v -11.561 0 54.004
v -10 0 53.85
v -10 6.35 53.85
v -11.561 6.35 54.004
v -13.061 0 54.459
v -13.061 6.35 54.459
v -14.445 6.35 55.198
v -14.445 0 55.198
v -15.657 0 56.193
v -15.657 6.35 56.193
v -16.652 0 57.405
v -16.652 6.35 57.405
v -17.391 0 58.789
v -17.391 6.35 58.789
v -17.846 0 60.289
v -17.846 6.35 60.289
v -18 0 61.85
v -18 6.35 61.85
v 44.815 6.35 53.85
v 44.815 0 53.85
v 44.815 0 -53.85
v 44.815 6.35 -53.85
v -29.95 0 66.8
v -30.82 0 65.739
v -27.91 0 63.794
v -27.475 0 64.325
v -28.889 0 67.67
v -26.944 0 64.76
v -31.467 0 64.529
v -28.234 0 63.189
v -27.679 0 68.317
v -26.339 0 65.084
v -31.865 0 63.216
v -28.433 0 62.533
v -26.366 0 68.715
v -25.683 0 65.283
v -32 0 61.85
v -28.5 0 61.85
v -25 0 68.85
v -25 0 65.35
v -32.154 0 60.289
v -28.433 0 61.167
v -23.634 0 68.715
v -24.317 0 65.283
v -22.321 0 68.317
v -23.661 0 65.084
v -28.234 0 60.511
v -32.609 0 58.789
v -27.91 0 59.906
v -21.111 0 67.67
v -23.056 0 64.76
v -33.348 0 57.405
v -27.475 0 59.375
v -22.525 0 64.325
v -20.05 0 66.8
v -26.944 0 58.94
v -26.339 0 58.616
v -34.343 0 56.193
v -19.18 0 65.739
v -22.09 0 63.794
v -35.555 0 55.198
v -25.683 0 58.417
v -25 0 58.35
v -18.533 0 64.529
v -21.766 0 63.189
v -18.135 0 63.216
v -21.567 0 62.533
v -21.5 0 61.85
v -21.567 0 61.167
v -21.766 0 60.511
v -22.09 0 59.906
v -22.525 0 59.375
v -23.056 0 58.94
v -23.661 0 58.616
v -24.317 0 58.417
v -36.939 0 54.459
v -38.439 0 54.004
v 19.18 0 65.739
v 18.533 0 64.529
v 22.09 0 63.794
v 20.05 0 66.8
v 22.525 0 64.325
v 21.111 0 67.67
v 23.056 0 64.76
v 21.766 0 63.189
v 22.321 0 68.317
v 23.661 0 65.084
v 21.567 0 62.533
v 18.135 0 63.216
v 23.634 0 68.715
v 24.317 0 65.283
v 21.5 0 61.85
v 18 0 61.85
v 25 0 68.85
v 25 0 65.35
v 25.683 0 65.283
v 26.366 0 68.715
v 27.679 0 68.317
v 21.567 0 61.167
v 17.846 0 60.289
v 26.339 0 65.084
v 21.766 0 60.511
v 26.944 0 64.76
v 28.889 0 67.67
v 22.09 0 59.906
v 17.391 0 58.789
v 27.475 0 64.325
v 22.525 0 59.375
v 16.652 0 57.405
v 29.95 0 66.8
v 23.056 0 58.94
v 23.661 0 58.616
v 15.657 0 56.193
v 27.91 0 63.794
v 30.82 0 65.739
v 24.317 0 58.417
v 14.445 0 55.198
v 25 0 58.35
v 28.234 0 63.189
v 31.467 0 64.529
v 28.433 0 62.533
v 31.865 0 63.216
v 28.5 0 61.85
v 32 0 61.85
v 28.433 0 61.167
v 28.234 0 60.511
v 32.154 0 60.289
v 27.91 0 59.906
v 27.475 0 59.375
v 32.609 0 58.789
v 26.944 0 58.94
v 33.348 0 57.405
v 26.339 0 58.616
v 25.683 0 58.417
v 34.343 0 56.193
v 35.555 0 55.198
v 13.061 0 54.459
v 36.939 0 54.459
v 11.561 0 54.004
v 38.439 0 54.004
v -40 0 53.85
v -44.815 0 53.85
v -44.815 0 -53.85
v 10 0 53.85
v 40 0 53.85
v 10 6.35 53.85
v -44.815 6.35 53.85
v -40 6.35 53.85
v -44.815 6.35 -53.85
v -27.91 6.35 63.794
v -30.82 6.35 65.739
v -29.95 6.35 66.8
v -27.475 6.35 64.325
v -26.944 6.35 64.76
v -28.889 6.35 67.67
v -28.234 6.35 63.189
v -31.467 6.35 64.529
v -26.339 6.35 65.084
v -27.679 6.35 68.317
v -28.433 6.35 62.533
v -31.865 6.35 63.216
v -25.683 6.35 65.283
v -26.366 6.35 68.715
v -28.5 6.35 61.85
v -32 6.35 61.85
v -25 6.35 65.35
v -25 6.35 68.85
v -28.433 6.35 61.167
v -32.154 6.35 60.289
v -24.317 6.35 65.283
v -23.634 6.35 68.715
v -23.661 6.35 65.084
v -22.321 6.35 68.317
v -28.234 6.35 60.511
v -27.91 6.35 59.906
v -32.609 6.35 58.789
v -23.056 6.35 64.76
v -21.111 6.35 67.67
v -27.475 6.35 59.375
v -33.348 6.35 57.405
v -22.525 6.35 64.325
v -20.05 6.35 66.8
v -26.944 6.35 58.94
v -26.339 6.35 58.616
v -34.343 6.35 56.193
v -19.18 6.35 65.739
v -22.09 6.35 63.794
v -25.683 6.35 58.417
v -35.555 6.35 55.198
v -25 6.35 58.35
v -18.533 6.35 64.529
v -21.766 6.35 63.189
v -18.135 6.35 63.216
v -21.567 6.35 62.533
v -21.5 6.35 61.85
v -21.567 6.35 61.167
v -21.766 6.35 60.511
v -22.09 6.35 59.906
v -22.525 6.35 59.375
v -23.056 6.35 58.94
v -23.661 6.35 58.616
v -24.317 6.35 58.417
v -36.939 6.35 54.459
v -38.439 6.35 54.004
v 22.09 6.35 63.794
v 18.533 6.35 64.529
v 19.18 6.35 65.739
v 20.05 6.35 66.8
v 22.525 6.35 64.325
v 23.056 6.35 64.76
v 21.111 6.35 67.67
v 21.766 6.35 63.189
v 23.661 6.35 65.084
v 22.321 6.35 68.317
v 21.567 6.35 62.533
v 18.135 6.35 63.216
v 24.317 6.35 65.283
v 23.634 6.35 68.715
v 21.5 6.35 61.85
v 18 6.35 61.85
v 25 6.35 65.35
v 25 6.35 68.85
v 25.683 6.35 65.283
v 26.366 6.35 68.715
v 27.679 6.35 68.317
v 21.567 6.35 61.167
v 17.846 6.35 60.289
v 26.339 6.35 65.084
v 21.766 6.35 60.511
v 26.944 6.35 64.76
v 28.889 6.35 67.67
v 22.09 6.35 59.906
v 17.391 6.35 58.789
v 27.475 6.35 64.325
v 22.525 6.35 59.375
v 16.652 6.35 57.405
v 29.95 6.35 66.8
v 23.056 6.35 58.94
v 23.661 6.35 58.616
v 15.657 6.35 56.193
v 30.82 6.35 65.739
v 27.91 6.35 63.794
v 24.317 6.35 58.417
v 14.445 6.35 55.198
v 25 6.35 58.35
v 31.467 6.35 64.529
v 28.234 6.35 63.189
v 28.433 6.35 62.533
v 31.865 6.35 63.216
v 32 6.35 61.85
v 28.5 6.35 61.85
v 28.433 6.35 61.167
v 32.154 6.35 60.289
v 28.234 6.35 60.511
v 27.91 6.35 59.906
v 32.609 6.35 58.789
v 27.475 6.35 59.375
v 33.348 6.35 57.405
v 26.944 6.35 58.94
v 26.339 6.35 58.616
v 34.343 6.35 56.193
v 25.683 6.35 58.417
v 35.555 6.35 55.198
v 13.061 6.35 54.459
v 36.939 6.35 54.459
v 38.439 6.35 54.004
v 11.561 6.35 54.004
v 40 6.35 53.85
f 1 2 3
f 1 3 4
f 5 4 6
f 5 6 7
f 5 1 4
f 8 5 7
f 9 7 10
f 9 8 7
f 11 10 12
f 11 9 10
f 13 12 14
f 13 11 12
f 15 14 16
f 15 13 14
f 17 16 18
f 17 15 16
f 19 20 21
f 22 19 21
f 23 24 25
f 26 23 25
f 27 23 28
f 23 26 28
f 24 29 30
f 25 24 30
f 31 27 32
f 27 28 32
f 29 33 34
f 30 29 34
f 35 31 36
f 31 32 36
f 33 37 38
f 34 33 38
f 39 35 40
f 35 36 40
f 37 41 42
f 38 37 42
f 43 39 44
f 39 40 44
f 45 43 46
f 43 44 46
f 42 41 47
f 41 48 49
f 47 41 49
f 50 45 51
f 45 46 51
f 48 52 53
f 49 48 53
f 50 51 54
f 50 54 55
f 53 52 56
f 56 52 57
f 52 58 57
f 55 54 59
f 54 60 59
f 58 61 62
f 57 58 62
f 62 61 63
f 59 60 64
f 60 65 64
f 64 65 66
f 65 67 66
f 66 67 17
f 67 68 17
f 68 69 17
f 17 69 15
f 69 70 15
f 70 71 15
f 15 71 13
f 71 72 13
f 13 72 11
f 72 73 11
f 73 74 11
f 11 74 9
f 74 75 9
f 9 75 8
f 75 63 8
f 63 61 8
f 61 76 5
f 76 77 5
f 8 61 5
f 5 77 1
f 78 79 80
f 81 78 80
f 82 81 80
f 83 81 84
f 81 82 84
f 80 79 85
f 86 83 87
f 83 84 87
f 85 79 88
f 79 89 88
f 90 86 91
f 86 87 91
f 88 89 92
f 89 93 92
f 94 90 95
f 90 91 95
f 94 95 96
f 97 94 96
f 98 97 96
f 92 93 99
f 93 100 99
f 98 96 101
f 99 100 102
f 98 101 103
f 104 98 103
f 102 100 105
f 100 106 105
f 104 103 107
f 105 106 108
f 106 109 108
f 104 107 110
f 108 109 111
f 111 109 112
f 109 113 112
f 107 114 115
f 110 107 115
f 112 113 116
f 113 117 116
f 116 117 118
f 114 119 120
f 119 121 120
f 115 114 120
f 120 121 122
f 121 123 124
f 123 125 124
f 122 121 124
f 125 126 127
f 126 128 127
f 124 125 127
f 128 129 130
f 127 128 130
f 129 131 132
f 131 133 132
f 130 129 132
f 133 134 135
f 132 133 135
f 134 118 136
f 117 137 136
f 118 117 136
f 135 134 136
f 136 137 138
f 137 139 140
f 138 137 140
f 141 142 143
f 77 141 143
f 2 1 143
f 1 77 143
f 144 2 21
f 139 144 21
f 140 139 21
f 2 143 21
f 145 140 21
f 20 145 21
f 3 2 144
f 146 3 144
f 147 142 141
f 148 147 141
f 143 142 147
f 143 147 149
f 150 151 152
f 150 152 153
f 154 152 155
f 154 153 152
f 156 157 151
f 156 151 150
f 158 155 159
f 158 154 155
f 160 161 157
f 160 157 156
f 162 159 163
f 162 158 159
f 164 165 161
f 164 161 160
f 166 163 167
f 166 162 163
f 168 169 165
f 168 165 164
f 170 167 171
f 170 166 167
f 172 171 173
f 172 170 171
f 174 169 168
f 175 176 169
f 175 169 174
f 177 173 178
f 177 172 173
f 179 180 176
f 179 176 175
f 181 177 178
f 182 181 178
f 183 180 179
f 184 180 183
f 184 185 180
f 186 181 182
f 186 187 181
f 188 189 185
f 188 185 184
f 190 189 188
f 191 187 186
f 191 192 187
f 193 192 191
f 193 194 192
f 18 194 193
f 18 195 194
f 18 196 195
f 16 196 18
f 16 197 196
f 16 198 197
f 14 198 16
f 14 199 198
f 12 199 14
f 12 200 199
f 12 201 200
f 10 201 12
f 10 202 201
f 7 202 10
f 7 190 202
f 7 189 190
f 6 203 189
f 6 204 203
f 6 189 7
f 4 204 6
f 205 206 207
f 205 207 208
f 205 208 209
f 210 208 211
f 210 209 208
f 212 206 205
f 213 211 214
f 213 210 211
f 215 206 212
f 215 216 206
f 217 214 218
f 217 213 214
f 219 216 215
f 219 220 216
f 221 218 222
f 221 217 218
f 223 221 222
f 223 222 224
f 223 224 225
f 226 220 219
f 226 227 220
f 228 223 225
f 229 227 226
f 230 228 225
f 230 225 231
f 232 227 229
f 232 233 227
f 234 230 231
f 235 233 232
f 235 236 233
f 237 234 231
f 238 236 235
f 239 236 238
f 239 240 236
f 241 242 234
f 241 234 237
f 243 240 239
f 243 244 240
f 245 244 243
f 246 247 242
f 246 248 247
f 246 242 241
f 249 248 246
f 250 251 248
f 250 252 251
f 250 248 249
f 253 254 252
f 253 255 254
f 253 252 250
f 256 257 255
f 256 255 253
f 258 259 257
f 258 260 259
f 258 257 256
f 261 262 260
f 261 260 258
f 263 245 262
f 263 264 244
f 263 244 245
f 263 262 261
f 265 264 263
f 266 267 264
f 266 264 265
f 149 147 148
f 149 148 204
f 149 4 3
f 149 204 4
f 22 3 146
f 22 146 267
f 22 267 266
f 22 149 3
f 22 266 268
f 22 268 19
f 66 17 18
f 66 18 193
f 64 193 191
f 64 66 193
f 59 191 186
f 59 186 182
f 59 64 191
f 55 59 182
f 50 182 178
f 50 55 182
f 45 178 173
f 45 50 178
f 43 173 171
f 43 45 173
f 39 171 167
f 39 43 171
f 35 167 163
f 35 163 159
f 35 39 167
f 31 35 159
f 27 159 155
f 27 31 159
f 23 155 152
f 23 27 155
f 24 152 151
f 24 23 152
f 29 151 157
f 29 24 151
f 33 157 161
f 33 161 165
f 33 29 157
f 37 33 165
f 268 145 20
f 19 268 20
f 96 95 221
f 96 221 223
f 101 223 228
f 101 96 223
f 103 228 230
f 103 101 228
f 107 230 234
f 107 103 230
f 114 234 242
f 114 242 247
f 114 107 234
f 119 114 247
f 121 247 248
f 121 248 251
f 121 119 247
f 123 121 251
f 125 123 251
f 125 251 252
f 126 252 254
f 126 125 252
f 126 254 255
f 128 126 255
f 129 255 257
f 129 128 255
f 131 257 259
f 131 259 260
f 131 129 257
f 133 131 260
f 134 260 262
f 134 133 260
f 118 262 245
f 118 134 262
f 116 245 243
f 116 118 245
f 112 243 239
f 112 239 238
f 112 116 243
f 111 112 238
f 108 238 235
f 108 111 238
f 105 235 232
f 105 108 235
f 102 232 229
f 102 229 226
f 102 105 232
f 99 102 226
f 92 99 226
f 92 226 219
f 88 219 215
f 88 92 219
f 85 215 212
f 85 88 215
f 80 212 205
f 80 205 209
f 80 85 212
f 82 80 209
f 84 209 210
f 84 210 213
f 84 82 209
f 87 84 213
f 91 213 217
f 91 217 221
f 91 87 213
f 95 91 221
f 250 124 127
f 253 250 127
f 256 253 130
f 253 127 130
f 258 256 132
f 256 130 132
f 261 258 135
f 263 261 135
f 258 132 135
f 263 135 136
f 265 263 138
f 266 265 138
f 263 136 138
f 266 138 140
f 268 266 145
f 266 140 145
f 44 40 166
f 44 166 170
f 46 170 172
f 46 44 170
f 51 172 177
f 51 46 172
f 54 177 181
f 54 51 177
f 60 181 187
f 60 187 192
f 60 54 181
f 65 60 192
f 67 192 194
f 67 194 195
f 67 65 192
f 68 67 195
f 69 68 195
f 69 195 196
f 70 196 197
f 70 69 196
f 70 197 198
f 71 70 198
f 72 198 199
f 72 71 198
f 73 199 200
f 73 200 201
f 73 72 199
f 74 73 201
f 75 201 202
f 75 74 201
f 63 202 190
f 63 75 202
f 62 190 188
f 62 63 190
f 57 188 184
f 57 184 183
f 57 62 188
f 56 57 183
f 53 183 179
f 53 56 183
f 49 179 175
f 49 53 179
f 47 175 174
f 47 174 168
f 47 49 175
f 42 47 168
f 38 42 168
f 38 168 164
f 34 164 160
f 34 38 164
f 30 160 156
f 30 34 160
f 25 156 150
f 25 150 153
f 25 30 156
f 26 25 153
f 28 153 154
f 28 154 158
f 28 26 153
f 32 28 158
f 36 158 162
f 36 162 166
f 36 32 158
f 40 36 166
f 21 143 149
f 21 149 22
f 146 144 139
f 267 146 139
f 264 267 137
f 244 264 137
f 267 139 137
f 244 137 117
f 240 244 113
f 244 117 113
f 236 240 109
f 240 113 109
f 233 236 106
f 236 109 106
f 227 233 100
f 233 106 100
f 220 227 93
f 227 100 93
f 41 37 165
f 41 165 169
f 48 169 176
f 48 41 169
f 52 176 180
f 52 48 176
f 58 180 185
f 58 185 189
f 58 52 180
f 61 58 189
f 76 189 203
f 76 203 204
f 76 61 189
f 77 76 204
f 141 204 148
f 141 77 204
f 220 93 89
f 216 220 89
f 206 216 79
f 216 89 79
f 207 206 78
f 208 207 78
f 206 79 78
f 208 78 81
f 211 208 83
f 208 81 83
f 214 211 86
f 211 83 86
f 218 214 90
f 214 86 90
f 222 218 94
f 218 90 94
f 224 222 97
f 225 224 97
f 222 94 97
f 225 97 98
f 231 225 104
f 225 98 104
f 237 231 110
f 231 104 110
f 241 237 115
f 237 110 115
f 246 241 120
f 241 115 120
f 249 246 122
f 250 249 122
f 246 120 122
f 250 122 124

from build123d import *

# Parameters (mm, degrees)
SKETCH1_W           = 89.63
SKETCH1_H           = 107.7
BOSS_EXTRUDE1_DEPTH = 6.35
SKETCH2_R           = 3.5
BOSS_EXTRUDE2_DEPTH = 6.35


with BuildPart() as part:
    # Sketch1 → Boss-Extrude1 (new body)
    with BuildSketch(Plane(origin=(0, 0, 0), x_dir=(1, 0, 0), z_dir=(0, 1, 0))):
        Rectangle(SKETCH1_W, SKETCH1_H)
    extrude(amount=BOSS_EXTRUDE1_DEPTH)

    # Sketch2 → Boss-Extrude2 (add)
    # profile 1 of 2: a face of its own
    with BuildSketch(Plane(origin=(0, 0, 0), x_dir=(1, 0, 0), z_dir=(0, 1, 0))):
        with BuildLine():
            Line((-40, -53.85), (-10, -53.85))
            ThreePointArc((-10, -53.85), (-15.656854249, -56.193145751), (-18, -61.85))
            ThreePointArc((-18, -61.85), (-25, -68.85), (-32, -61.85))
            ThreePointArc((-32, -61.85), (-34.343145751, -56.193145751), (-40, -53.85))
        make_face()
        with Locations(Location((-25, -61.85, 0), (0, 0, 270))):
            Circle(SKETCH2_R, mode=Mode.SUBTRACT)
    # profile 2 of 2: a face of its own
    with BuildSketch(Plane(origin=(0, 0, 0), x_dir=(1, 0, 0), z_dir=(0, 1, 0))):
        with BuildLine():
            Line((40, -53.85), (10, -53.85))
            ThreePointArc((10, -53.85), (15.656854249, -56.193145751), (18, -61.85))
            ThreePointArc((18, -61.85), (25, -68.85), (32, -61.85))
            ThreePointArc((32, -61.85), (34.343145751, -56.193145751), (40, -53.85))
        make_face()
        with Locations(Location((25, -61.85, 0), (0, 0, 270))):
            Circle(SKETCH2_R, mode=Mode.SUBTRACT)
    extrude(amount=BOSS_EXTRUDE2_DEPTH)


solid = part.part
